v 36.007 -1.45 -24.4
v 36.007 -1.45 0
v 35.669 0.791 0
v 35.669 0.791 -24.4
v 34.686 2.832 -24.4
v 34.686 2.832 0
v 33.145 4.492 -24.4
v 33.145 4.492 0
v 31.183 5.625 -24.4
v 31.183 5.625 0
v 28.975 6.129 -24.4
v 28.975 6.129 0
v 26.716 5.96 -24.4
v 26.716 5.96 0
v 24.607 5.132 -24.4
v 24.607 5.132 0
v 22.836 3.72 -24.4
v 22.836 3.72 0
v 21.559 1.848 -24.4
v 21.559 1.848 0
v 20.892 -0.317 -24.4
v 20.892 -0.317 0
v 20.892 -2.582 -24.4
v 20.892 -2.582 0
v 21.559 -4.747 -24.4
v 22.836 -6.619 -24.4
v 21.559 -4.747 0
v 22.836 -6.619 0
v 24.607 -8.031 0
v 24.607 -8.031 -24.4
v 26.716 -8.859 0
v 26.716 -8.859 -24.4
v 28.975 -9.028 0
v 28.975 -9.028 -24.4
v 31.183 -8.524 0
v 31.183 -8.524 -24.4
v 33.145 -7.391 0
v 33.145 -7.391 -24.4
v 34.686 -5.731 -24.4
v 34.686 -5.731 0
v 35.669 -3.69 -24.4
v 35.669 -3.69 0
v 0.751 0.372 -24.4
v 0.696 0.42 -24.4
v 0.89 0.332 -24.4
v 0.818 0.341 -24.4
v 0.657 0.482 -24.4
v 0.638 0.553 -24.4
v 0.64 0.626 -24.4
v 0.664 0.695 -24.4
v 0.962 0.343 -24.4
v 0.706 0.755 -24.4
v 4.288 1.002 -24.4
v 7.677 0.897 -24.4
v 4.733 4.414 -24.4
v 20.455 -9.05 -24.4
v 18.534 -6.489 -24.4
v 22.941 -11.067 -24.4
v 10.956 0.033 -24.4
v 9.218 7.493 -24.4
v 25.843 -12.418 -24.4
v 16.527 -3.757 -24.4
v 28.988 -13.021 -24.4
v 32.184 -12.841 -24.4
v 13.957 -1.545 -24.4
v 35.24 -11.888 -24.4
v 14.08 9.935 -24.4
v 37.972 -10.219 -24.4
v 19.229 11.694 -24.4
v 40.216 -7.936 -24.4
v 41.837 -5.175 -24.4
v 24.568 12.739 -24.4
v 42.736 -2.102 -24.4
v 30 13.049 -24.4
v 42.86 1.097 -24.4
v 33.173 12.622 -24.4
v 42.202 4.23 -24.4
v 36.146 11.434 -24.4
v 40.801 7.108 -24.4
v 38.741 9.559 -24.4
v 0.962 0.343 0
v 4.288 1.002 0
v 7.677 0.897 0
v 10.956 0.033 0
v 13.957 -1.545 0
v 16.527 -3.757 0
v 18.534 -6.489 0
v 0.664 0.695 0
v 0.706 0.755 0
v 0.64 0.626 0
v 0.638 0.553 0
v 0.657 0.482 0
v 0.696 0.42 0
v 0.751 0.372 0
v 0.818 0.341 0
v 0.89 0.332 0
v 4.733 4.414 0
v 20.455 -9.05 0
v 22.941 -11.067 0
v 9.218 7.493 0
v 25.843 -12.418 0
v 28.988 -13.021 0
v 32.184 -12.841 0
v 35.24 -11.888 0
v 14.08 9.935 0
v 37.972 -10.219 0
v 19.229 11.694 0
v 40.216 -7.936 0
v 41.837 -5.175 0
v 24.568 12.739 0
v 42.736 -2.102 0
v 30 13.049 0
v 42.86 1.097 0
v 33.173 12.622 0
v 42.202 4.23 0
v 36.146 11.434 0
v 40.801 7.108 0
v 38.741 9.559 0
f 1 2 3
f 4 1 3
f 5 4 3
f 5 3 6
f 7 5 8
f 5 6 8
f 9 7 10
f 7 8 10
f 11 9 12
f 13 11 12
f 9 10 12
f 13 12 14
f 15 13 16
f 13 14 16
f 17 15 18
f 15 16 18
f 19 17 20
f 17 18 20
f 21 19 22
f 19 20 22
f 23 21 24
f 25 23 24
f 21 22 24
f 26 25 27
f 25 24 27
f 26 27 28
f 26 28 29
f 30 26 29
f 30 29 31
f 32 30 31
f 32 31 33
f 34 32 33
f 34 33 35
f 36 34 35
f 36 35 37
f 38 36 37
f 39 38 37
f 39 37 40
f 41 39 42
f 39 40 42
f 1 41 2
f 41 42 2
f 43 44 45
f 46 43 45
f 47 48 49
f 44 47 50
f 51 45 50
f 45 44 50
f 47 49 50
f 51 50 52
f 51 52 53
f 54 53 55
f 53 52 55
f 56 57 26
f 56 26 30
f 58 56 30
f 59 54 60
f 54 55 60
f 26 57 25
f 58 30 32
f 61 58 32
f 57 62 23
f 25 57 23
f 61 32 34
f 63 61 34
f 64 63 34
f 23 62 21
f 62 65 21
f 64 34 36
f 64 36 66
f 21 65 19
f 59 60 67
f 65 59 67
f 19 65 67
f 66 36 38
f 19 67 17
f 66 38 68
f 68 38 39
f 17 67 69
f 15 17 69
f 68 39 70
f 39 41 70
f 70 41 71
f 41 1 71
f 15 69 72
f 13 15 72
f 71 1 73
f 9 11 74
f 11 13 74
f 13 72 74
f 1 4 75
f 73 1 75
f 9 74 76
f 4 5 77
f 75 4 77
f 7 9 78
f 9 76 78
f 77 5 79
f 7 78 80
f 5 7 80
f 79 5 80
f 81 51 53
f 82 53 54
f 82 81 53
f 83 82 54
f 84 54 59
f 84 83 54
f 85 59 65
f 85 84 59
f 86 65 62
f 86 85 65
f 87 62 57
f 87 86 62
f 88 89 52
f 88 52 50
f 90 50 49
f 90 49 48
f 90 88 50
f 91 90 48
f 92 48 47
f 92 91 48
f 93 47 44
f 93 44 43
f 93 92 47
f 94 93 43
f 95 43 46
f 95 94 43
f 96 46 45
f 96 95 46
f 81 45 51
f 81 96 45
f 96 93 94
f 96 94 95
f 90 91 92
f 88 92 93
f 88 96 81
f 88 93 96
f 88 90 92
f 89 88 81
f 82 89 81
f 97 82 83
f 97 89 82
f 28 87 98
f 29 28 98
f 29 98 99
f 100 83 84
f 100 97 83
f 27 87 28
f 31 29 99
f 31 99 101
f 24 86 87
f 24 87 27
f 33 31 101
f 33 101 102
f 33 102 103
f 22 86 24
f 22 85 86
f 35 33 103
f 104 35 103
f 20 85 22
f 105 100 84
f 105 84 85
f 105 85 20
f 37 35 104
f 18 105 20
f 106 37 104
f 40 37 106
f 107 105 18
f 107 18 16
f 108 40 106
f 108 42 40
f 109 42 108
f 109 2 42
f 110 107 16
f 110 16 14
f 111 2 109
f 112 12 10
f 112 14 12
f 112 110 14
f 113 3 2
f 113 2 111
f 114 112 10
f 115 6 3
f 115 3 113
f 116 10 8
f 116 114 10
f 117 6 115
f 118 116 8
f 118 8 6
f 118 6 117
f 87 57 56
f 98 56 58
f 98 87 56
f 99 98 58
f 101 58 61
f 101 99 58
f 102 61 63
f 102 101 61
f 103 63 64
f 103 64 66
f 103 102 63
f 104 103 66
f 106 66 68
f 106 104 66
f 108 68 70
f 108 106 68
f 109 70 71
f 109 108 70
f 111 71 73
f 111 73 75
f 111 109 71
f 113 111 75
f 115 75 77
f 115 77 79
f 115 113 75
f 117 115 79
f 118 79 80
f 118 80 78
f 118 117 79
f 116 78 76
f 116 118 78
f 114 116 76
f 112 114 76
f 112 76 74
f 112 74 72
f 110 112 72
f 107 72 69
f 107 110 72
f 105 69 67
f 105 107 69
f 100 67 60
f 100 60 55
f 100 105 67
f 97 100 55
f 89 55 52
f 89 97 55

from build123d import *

# Parameters (mm, degrees)
BASE_SKETCH_R = 7.6
BASE_DEPTH    = 24.4


with BuildPart() as part:
    # Base Sketch → Base (new body)
    with BuildSketch(Plane.XY):
        with BuildLine():
            ThreePointArc((30, 13.049209956), (14.080181926, 9.934954429), (0.706182938, 0.75479397))
            ThreePointArc((0.706182938, 0.75479397), (0.674336237, 0.449442107), (0.96247377, 0.34346695))
            ThreePointArc((0.96247377, 0.34346695), (10.955807445, 0.032866395), (18.534024513, -6.488929117))
            ThreePointArc((18.534024513, -6.488929117), (41.11144962, -6.605033659), (30, 13.049209956))
        make_face()
        with Locations((28.406836056, -1.449568901)):
            Circle(BASE_SKETCH_R, mode=Mode.SUBTRACT)
    extrude(amount=-BASE_DEPTH)


solid = part.part
